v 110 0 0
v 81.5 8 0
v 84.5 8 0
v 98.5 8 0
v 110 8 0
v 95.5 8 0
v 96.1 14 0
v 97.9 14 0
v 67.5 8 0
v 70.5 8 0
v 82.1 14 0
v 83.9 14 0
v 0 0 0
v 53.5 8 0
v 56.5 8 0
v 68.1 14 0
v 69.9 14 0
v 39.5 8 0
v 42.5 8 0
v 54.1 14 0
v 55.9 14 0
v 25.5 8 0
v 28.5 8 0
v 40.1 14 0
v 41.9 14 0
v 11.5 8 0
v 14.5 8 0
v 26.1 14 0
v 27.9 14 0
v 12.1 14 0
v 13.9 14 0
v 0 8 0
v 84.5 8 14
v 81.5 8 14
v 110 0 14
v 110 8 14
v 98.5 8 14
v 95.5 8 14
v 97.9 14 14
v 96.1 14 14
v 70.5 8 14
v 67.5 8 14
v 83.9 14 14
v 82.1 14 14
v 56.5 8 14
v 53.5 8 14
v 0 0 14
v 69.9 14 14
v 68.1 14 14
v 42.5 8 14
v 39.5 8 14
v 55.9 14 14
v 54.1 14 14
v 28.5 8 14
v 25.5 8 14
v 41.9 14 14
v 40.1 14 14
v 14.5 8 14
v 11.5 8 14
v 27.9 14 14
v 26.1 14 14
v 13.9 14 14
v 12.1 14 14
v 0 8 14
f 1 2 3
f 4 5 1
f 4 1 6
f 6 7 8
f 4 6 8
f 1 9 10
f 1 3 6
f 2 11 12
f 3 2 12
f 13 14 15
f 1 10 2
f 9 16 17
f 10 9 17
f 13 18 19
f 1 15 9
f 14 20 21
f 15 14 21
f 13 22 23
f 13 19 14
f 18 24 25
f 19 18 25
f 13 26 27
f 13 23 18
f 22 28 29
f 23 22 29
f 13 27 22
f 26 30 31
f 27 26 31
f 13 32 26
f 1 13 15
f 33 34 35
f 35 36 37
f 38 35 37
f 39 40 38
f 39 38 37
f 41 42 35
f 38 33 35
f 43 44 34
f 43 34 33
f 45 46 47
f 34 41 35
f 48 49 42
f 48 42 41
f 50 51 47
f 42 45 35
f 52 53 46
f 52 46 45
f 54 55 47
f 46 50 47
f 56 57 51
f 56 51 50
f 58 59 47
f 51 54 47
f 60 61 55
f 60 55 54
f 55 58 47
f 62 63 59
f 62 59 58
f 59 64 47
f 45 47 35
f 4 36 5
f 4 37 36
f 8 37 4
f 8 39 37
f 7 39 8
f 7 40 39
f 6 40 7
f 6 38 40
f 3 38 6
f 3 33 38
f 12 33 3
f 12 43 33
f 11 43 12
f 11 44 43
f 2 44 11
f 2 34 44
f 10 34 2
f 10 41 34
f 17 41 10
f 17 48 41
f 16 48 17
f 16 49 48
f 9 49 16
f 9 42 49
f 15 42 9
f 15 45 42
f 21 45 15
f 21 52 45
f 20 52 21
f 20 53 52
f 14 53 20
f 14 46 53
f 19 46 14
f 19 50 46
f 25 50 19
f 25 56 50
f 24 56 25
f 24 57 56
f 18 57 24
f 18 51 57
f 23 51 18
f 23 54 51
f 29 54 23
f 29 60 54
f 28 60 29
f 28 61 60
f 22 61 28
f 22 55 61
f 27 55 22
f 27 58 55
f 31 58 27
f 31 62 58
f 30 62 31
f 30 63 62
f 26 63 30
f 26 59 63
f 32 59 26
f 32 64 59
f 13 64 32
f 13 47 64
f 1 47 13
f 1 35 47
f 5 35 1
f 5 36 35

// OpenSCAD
$fn = 32;

// ----------------------------------------------------------------------
// Gear rack: 7 teeth on a 110 mm bar, pitch 14 mm
// ----------------------------------------------------------------------

// --- parameters (mm) ---
profile_height = 14;      // extrusion height
profile_points = 32;      // points of the closed outline

profile = [[0, 0], [110, 0], [110, 8], [98.5, 8], [97.9, 14], [96.1, 14], [95.5, 8], [84.5, 8], [83.9, 14], [82.1, 14], [81.5, 8], [70.5, 8], [69.9, 14], [68.1, 14], [67.5, 8], [56.5, 8], [55.9, 14], [54.1, 14], [53.5, 8], [42.5, 8], [41.9, 14], [40.1, 14], [39.5, 8], [28.5, 8], [27.9, 14], [26.1, 14], [25.5, 8], [14.5, 8], [13.9, 14], [12.1, 14], [11.5, 8], [0, 8]];  // single closed polygon, 32 points, counter clockwise

// --- the one profile operation ---
linear_extrude(height = profile_height) polygon(points = profile);
